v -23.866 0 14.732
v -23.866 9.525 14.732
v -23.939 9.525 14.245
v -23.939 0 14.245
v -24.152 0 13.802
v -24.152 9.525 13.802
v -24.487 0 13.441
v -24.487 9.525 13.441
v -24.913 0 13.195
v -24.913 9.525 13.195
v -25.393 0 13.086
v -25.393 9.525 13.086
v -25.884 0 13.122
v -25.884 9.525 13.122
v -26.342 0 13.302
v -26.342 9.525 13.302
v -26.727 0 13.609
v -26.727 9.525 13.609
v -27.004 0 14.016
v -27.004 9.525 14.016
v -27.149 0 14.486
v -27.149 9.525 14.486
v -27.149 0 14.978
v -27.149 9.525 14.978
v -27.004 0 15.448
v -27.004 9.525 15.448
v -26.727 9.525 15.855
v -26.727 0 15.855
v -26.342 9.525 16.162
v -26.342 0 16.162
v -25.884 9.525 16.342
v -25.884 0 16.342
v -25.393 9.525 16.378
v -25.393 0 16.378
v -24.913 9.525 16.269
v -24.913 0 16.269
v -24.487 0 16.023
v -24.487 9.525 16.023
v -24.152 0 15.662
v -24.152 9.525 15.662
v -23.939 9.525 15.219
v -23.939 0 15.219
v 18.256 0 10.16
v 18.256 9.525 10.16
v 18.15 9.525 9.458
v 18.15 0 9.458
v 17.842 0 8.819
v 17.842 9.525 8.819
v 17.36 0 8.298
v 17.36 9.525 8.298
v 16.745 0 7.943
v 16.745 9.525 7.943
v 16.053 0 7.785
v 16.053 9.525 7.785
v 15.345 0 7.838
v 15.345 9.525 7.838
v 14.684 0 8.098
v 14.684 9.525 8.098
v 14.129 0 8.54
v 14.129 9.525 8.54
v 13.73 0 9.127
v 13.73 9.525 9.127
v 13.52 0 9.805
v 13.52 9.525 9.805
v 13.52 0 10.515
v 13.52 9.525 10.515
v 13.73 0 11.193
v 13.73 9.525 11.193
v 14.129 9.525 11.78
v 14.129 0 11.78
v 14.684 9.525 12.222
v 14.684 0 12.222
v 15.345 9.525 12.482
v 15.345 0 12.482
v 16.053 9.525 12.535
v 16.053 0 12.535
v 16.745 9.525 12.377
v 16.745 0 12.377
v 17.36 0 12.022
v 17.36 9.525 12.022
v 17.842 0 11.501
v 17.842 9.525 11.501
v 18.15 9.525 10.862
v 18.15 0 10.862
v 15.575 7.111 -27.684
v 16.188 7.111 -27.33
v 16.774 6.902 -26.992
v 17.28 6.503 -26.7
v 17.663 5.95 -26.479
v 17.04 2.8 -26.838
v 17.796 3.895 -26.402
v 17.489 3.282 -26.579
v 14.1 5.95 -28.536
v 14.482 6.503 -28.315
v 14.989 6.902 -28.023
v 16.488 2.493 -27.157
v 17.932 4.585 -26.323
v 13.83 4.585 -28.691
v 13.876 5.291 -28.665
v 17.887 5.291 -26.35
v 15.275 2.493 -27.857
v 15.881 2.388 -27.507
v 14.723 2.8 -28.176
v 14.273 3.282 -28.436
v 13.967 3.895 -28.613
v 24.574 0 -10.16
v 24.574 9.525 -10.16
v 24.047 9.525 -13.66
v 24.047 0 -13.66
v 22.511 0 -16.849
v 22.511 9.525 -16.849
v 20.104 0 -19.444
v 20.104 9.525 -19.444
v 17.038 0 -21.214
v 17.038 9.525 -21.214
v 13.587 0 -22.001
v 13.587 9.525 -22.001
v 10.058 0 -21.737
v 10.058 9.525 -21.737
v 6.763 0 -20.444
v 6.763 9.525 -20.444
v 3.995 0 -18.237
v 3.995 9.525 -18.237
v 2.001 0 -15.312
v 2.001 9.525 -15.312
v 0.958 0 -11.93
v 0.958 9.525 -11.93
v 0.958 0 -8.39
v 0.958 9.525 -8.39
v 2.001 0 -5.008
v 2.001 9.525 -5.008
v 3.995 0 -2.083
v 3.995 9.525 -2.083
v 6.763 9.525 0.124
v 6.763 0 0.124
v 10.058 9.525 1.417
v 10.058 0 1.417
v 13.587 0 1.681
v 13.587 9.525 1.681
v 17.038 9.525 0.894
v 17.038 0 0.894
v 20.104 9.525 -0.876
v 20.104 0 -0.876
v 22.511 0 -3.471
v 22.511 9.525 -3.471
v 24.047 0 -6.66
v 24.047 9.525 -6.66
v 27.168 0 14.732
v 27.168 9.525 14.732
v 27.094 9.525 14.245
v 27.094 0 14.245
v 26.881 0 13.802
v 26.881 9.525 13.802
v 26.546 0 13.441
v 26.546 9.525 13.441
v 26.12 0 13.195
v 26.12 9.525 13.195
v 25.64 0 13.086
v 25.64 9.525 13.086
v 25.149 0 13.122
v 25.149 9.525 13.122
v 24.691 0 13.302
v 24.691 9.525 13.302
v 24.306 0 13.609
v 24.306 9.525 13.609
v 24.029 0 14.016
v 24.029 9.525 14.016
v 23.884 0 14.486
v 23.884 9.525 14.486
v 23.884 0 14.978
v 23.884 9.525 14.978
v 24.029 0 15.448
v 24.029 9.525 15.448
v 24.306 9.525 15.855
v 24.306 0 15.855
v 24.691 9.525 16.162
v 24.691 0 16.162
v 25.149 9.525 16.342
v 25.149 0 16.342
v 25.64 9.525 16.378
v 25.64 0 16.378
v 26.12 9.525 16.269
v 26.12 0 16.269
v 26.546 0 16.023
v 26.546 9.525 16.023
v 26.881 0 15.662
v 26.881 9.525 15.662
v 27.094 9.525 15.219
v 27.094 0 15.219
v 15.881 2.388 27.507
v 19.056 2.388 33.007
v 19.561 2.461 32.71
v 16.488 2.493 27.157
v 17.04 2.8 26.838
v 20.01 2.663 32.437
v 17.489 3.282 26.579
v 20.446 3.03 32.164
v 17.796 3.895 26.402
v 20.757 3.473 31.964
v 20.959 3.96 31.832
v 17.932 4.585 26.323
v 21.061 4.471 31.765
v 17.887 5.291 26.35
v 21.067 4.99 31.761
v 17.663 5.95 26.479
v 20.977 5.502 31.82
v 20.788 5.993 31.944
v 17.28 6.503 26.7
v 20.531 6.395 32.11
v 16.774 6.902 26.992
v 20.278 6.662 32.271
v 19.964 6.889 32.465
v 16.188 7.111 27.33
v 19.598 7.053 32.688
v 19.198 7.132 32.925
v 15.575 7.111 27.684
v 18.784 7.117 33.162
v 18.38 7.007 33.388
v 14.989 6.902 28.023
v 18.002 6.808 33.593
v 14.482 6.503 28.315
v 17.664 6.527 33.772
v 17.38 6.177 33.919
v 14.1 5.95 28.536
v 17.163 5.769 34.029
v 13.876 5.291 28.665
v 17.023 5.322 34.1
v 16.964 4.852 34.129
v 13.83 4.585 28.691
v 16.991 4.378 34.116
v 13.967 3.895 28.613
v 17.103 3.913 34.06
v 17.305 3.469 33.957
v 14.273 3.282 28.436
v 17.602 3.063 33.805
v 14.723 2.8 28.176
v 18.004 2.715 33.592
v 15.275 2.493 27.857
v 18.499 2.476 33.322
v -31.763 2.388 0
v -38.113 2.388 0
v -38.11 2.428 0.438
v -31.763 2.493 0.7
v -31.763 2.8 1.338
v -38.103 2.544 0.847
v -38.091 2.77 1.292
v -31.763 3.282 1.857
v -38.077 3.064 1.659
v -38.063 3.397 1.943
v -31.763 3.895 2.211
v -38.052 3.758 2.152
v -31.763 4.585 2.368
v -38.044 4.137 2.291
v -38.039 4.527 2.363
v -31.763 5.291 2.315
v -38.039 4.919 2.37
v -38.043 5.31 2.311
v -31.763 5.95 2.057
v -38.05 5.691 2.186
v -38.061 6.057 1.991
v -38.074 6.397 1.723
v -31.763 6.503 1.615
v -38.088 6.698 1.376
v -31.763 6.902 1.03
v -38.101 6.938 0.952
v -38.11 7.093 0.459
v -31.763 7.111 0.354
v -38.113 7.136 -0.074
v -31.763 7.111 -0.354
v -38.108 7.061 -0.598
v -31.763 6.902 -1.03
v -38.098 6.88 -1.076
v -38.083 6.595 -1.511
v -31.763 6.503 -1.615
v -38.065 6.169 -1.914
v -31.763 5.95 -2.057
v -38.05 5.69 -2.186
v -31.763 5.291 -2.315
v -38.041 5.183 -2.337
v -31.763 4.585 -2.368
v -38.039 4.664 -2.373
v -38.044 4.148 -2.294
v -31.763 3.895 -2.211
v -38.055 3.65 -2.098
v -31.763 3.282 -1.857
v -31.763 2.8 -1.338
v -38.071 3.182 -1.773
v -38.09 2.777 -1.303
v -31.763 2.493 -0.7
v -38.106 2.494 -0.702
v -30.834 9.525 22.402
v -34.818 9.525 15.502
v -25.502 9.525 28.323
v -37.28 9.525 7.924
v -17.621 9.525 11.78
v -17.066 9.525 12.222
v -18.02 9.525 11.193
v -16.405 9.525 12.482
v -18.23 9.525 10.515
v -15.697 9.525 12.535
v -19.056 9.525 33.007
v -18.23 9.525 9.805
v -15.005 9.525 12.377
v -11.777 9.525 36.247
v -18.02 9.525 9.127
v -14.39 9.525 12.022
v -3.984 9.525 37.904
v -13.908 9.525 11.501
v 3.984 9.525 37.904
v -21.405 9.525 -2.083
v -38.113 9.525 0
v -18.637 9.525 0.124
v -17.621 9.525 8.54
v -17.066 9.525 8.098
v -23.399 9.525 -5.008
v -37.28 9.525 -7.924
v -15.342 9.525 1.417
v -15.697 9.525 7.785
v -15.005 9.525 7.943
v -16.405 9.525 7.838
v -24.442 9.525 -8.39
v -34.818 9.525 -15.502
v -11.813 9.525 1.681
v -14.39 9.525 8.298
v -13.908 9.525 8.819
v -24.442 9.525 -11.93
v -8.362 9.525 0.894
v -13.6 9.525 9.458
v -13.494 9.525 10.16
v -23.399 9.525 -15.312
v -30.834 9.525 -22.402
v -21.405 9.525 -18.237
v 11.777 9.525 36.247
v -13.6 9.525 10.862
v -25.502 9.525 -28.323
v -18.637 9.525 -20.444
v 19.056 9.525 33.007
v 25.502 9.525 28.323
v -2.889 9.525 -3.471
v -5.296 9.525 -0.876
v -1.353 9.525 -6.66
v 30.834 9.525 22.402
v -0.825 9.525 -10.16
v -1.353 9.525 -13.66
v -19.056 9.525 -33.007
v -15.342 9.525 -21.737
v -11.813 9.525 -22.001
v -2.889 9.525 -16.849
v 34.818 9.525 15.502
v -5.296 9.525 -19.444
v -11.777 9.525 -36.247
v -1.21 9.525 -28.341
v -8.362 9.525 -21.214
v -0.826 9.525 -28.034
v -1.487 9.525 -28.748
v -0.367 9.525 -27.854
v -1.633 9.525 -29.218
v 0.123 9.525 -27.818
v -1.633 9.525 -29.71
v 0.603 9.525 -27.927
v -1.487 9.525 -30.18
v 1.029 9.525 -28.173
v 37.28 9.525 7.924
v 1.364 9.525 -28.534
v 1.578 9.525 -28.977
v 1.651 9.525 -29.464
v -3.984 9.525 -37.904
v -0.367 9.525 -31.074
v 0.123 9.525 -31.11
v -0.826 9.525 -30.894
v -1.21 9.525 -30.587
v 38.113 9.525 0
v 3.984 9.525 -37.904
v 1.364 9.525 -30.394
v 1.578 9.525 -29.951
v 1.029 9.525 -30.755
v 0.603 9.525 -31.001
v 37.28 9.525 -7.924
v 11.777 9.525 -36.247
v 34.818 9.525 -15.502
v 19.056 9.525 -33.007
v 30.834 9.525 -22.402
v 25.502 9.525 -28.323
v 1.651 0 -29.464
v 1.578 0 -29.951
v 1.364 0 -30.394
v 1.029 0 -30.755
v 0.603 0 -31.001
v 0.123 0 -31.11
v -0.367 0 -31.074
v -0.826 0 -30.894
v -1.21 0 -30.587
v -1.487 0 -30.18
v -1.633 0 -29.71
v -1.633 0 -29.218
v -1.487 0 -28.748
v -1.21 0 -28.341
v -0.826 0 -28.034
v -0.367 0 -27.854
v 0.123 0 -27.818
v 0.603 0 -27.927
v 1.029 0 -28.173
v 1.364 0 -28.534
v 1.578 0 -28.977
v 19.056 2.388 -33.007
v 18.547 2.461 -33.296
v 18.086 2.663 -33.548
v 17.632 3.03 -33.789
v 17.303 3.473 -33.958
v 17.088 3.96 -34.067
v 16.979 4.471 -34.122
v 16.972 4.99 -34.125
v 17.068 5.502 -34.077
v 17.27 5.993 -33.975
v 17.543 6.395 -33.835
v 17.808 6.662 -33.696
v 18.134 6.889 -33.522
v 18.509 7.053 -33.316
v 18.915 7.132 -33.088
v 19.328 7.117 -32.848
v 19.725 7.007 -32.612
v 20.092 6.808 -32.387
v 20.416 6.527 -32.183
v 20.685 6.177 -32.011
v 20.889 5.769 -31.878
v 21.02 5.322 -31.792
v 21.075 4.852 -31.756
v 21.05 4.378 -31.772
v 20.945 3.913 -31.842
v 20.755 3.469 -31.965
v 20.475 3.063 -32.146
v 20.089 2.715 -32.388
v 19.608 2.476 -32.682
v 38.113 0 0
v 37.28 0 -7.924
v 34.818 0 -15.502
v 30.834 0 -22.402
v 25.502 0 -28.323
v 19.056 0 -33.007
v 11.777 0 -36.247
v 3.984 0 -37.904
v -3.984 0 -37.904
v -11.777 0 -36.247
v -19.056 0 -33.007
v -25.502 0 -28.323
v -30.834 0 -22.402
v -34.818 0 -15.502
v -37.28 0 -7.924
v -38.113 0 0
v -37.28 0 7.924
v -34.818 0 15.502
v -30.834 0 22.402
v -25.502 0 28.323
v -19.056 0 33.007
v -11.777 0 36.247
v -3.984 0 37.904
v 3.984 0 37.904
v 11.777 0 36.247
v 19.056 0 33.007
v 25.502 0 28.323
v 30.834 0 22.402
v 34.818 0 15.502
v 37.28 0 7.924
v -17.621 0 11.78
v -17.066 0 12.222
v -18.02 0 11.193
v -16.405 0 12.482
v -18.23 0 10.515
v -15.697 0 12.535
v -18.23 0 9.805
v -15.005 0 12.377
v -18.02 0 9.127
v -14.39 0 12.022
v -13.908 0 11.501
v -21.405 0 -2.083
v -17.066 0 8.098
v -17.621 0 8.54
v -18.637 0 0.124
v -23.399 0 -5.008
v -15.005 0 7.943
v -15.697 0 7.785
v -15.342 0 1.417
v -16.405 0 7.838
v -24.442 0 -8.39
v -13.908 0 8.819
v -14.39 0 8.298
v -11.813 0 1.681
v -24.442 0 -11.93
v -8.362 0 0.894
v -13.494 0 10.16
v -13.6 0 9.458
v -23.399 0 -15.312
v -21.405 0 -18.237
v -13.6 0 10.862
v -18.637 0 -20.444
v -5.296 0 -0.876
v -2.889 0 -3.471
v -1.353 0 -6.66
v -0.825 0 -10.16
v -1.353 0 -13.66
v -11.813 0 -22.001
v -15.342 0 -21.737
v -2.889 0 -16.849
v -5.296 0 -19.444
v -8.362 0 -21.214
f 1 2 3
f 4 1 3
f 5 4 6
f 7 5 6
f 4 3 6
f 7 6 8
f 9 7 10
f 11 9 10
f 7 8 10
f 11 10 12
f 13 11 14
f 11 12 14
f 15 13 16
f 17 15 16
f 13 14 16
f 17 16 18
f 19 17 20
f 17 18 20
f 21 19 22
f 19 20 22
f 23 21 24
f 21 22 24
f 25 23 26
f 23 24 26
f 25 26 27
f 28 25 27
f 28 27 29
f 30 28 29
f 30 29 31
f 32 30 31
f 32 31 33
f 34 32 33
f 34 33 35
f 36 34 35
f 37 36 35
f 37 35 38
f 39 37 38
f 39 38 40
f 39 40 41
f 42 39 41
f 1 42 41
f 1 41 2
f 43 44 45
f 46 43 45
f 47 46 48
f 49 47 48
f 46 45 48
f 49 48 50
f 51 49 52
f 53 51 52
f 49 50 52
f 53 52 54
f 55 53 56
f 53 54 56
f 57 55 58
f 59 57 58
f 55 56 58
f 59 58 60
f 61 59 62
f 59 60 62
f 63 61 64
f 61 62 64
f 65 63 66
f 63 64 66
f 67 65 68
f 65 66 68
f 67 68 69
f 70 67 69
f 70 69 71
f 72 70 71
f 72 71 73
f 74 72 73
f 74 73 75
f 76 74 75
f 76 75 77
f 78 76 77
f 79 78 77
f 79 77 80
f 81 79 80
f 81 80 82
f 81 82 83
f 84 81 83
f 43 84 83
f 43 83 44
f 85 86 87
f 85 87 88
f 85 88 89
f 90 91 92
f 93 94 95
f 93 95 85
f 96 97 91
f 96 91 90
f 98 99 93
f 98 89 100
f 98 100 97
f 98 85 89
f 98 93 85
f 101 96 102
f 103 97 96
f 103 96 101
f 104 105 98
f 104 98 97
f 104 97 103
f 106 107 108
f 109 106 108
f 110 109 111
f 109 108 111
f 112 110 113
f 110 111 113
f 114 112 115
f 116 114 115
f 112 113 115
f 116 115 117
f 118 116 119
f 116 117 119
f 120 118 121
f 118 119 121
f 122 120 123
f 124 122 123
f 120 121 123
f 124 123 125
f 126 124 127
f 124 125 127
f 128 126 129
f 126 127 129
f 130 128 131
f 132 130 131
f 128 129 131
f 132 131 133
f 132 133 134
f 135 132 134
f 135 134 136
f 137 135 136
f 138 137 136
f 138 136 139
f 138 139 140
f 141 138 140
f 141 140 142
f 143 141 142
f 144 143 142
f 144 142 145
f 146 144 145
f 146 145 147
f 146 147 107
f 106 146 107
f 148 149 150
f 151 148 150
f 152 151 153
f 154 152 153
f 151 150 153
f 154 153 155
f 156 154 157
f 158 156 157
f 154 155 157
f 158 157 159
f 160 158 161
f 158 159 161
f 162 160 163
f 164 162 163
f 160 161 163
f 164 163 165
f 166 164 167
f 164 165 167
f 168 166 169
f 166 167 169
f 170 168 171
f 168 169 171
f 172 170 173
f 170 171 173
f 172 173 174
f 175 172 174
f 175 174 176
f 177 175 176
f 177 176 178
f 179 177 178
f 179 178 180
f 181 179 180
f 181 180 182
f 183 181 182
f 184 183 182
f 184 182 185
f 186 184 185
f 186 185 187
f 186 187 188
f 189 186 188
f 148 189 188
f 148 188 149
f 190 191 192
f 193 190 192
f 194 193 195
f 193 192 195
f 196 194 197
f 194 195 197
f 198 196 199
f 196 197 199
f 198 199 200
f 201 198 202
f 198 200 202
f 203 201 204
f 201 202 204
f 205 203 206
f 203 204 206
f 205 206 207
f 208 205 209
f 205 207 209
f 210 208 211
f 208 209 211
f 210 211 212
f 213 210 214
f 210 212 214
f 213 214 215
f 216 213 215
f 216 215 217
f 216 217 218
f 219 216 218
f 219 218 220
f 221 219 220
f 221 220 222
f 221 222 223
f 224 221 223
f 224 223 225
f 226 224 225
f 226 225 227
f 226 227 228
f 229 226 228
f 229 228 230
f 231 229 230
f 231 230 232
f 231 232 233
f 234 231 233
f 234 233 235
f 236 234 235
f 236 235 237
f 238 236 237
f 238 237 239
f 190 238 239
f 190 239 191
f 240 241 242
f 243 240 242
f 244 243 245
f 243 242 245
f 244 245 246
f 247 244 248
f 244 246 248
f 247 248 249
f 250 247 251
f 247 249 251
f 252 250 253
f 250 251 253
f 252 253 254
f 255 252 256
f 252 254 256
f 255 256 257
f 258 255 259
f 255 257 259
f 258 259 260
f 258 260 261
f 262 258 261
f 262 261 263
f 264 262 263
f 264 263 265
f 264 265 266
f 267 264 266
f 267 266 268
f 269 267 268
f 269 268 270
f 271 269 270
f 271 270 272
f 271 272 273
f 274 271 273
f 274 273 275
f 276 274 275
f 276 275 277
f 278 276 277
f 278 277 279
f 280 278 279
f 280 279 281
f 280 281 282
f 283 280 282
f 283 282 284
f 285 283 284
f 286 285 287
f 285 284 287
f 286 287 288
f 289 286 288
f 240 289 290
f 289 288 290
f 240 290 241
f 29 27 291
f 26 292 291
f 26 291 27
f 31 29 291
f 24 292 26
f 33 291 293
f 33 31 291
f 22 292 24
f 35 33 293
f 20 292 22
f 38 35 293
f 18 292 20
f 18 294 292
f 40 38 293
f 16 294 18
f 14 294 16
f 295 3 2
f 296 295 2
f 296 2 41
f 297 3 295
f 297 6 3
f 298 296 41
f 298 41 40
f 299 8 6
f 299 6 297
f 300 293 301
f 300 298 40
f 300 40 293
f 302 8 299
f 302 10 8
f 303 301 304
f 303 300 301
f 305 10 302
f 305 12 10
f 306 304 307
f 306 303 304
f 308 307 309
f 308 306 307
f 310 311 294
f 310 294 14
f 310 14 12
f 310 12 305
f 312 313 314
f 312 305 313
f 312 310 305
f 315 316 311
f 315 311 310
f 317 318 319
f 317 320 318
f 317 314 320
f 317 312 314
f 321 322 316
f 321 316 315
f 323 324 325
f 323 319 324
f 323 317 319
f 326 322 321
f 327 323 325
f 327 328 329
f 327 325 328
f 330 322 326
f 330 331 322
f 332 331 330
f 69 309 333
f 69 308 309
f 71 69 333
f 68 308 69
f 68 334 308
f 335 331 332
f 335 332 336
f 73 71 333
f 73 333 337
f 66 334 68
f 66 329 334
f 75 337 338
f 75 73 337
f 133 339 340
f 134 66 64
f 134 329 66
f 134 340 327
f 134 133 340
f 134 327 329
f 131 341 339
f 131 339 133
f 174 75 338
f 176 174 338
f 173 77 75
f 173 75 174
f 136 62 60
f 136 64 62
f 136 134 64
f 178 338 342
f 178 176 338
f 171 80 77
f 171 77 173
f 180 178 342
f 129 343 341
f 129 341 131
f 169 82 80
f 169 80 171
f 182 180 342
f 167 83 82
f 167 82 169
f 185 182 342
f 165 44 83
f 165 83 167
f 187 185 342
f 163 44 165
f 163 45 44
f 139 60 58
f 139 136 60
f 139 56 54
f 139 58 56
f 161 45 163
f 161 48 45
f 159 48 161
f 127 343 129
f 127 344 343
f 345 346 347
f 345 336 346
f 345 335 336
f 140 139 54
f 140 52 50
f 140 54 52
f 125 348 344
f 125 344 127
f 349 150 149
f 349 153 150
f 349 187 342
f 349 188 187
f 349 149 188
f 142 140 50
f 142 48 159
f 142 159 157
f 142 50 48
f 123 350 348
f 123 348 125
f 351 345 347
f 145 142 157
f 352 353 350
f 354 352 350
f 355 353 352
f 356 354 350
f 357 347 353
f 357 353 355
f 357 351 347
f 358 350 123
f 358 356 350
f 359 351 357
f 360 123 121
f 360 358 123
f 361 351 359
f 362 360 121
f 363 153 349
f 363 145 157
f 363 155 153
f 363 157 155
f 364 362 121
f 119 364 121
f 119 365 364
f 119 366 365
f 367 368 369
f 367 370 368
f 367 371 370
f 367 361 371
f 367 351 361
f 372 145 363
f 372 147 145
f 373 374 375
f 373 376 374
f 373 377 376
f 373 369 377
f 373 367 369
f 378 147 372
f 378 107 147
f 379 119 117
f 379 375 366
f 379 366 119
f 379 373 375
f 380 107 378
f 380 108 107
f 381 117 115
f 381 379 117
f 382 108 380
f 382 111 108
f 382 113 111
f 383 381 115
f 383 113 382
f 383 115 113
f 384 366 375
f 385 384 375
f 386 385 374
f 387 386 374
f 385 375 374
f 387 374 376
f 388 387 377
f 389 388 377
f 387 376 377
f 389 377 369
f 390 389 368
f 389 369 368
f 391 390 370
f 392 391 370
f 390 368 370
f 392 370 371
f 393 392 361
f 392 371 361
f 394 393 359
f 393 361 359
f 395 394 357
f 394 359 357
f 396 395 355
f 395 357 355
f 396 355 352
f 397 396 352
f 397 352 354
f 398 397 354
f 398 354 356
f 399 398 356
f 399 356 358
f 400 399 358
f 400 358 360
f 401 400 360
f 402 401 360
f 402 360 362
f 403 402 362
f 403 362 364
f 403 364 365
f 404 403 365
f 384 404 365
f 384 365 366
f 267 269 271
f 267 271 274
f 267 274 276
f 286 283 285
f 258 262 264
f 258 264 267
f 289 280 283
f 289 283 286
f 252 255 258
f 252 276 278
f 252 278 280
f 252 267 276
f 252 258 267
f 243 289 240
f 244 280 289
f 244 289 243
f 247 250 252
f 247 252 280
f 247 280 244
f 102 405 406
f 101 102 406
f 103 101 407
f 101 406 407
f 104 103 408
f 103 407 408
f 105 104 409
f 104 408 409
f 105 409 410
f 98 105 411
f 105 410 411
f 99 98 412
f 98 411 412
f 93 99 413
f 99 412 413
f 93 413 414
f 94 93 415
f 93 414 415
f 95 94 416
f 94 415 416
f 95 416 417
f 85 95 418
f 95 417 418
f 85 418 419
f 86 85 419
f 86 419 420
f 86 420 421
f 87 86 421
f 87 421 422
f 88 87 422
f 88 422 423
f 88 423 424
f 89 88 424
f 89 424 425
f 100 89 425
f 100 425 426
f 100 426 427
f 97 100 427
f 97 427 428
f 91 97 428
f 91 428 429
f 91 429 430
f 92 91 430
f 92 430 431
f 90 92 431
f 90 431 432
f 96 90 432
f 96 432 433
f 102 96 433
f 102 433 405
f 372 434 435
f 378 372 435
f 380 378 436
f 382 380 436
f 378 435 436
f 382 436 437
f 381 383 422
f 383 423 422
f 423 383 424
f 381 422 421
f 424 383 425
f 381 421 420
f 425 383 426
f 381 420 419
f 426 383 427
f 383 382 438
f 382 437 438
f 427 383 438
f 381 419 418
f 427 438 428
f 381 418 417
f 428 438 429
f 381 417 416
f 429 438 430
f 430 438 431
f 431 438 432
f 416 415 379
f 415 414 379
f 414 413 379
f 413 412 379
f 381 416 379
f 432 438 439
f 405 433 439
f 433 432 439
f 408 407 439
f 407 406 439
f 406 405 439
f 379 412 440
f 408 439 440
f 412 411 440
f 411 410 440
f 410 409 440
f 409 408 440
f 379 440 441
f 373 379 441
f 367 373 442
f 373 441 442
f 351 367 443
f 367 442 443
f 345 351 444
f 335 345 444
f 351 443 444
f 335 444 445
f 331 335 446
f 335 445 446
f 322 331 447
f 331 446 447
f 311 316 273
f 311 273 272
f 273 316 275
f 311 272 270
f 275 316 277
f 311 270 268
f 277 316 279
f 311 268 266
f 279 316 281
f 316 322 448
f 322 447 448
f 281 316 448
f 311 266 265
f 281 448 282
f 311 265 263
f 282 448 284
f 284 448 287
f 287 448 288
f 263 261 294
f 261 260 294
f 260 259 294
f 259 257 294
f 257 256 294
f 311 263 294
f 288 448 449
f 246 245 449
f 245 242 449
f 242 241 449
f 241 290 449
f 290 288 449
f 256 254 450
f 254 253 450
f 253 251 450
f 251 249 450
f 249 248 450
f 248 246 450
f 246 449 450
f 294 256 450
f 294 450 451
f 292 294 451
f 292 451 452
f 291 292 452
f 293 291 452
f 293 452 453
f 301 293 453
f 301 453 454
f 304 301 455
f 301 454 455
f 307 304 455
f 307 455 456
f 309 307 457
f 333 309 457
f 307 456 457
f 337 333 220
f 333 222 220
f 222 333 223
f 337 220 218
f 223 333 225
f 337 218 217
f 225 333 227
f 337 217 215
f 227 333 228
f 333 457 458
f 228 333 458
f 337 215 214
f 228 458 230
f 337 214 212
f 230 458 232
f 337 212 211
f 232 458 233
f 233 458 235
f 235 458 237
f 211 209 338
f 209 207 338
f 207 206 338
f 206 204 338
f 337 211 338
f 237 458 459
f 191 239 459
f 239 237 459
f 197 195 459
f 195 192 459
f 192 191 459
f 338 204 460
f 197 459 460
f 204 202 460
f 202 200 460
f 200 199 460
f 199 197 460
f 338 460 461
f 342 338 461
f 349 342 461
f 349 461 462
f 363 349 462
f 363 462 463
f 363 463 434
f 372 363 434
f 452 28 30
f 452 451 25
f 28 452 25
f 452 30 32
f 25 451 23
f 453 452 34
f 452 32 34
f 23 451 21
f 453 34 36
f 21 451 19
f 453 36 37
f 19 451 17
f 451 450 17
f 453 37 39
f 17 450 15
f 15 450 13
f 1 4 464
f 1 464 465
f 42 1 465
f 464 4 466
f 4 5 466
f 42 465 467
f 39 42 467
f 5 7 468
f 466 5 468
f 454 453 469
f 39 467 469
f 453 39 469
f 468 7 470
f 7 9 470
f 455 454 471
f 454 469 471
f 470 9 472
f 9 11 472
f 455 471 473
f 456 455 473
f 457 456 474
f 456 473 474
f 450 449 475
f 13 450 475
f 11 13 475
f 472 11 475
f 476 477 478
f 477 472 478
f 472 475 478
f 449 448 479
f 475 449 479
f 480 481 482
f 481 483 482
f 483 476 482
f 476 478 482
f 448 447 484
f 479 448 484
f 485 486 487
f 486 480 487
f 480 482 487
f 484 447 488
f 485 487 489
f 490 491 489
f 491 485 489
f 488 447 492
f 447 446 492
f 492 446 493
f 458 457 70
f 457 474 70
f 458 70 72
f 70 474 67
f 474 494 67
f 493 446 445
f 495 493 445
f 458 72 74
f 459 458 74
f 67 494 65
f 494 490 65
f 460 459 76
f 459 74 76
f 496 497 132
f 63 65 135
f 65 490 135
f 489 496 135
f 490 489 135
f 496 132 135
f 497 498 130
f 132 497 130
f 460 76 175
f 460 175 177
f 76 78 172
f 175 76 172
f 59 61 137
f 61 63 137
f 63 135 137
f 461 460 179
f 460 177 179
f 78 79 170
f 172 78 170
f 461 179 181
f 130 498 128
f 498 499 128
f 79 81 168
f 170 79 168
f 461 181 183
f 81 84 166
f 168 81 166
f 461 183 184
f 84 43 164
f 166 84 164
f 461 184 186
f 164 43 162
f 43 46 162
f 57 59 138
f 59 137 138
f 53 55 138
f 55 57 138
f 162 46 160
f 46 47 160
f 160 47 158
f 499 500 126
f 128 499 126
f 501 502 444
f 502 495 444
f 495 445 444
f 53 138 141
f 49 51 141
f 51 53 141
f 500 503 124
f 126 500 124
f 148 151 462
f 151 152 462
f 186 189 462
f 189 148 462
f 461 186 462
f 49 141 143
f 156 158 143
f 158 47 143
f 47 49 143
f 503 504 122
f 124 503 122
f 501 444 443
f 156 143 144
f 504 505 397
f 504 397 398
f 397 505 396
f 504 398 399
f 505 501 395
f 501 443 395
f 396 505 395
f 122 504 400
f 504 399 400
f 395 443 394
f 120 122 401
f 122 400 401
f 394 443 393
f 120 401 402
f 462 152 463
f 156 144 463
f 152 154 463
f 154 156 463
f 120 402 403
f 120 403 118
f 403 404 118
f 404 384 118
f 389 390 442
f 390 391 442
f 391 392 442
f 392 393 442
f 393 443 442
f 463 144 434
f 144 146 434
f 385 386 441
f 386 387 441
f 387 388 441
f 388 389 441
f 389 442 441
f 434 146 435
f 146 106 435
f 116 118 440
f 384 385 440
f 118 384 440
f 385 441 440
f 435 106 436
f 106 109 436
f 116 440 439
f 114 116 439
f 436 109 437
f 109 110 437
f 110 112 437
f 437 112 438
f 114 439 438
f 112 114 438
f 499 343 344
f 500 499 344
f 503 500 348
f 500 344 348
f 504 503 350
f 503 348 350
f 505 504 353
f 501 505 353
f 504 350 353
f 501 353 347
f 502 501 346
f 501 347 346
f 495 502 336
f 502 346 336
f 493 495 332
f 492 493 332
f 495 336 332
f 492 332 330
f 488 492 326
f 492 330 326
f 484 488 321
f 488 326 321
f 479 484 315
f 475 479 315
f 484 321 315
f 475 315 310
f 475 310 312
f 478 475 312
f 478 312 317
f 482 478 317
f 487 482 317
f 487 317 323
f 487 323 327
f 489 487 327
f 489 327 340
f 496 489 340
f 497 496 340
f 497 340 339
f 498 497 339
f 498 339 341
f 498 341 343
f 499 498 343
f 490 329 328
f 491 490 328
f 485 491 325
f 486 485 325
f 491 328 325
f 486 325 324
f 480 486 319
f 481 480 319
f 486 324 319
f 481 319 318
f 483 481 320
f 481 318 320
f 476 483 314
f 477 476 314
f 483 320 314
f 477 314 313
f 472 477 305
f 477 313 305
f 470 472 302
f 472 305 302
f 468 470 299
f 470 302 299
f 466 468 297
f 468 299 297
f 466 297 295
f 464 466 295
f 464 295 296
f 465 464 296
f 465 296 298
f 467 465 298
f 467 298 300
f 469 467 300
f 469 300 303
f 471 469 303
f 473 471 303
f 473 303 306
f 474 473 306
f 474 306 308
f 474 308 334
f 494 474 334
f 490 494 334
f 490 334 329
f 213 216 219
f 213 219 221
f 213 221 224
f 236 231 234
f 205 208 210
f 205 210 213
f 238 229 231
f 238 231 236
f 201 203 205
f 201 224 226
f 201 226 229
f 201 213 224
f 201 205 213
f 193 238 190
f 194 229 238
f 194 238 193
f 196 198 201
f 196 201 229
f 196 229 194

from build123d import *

# Parameters (mm, degrees)
SKETCH1_R               = 38.1127
BOSS_EXTRUDE1_DEPTH     = 9.525
SKETCH2_R               = 1.651
SKETCH2_R_2             = 11.8745
CUT_EXTRUDE1_DEPTH      = 55.734645587
SKETCH4_R               = 2.3749
CUT_EXTRUDE2_DEPTH      = 6.35
CIRPATTERN1_COUNT       = 3
CUT_EXTRUDE3_DEPTH      = 55.734645747
CUT_EXTRUDE3_DEPTH_BACK = 55.734645747
SKETCH5_R               = 2.38125


with BuildPart() as part:
    # Sketch1 → Boss-Extrude1 (new body)
    with BuildSketch(Plane(origin=(0, 0, 0), x_dir=(1, 0, 0), z_dir=(0, 1, 0))):
        Circle(SKETCH1_R)
    extrude(amount=BOSS_EXTRUDE1_DEPTH)

    # Sketch2 → Cut-Extrude1 (cut, through all)
    with BuildSketch(Plane(origin=(0, 9.525, 0), x_dir=(1, 0, 0), z_dir=(0, 1, 0))):
        with Locations((0, 29.464)):
            Circle(SKETCH2_R)
        with Locations((25.516572497, -14.732)):
            Circle(SKETCH2_R)
        with Locations((-25.516572497, -14.732)):
            Circle(SKETCH2_R)
        with Locations((-12.7, 10.16)):
            Circle(SKETCH2_R_2)
        with Locations((12.7, 10.16)):
            Circle(SKETCH2_R_2)
    extrude(amount=-CUT_EXTRUDE1_DEPTH, mode=Mode.SUBTRACT)

    # Sketch4 → Cut-Extrude2 (cut)
    with BuildSketch(Plane(origin=(19.05635, 0, -33.006566407), x_dir=(0, -1, 0), z_dir=(0.499999999999998, 0, -0.8660254037844398))):
        with Locations((-4.7625, 0)):
            Circle(SKETCH4_R)
    cut_extrude2 = extrude(amount=-CUT_EXTRUDE2_DEPTH, mode=Mode.SUBTRACT)

    # CirPattern1: Cut-Extrude2 ×3 about axis
    cirpattern1_axis = Axis((0, 10.00125, 0), (0, -1, 0))
    for i in range(1, CIRPATTERN1_COUNT):
        add(cut_extrude2.rotate(cirpattern1_axis, i * 360 / CIRPATTERN1_COUNT), mode=Mode.SUBTRACT)

    # Sketch5 → Cut-Extrude3 (cut, two sides: drawn at the far end of the back side and taken through both)
    with BuildSketch(Plane(origin=(0, 9.525, 0), x_dir=(1, 0, 0), z_dir=(0, 1, 0)).offset(-CUT_EXTRUDE3_DEPTH_BACK)):
        with Locations((-15.875, -10.16)):
            Circle(SKETCH5_R)
        with Locations((15.875, -10.16)):
            Circle(SKETCH5_R)
    extrude(amount=CUT_EXTRUDE3_DEPTH + CUT_EXTRUDE3_DEPTH_BACK, mode=Mode.SUBTRACT)


solid = part.part
